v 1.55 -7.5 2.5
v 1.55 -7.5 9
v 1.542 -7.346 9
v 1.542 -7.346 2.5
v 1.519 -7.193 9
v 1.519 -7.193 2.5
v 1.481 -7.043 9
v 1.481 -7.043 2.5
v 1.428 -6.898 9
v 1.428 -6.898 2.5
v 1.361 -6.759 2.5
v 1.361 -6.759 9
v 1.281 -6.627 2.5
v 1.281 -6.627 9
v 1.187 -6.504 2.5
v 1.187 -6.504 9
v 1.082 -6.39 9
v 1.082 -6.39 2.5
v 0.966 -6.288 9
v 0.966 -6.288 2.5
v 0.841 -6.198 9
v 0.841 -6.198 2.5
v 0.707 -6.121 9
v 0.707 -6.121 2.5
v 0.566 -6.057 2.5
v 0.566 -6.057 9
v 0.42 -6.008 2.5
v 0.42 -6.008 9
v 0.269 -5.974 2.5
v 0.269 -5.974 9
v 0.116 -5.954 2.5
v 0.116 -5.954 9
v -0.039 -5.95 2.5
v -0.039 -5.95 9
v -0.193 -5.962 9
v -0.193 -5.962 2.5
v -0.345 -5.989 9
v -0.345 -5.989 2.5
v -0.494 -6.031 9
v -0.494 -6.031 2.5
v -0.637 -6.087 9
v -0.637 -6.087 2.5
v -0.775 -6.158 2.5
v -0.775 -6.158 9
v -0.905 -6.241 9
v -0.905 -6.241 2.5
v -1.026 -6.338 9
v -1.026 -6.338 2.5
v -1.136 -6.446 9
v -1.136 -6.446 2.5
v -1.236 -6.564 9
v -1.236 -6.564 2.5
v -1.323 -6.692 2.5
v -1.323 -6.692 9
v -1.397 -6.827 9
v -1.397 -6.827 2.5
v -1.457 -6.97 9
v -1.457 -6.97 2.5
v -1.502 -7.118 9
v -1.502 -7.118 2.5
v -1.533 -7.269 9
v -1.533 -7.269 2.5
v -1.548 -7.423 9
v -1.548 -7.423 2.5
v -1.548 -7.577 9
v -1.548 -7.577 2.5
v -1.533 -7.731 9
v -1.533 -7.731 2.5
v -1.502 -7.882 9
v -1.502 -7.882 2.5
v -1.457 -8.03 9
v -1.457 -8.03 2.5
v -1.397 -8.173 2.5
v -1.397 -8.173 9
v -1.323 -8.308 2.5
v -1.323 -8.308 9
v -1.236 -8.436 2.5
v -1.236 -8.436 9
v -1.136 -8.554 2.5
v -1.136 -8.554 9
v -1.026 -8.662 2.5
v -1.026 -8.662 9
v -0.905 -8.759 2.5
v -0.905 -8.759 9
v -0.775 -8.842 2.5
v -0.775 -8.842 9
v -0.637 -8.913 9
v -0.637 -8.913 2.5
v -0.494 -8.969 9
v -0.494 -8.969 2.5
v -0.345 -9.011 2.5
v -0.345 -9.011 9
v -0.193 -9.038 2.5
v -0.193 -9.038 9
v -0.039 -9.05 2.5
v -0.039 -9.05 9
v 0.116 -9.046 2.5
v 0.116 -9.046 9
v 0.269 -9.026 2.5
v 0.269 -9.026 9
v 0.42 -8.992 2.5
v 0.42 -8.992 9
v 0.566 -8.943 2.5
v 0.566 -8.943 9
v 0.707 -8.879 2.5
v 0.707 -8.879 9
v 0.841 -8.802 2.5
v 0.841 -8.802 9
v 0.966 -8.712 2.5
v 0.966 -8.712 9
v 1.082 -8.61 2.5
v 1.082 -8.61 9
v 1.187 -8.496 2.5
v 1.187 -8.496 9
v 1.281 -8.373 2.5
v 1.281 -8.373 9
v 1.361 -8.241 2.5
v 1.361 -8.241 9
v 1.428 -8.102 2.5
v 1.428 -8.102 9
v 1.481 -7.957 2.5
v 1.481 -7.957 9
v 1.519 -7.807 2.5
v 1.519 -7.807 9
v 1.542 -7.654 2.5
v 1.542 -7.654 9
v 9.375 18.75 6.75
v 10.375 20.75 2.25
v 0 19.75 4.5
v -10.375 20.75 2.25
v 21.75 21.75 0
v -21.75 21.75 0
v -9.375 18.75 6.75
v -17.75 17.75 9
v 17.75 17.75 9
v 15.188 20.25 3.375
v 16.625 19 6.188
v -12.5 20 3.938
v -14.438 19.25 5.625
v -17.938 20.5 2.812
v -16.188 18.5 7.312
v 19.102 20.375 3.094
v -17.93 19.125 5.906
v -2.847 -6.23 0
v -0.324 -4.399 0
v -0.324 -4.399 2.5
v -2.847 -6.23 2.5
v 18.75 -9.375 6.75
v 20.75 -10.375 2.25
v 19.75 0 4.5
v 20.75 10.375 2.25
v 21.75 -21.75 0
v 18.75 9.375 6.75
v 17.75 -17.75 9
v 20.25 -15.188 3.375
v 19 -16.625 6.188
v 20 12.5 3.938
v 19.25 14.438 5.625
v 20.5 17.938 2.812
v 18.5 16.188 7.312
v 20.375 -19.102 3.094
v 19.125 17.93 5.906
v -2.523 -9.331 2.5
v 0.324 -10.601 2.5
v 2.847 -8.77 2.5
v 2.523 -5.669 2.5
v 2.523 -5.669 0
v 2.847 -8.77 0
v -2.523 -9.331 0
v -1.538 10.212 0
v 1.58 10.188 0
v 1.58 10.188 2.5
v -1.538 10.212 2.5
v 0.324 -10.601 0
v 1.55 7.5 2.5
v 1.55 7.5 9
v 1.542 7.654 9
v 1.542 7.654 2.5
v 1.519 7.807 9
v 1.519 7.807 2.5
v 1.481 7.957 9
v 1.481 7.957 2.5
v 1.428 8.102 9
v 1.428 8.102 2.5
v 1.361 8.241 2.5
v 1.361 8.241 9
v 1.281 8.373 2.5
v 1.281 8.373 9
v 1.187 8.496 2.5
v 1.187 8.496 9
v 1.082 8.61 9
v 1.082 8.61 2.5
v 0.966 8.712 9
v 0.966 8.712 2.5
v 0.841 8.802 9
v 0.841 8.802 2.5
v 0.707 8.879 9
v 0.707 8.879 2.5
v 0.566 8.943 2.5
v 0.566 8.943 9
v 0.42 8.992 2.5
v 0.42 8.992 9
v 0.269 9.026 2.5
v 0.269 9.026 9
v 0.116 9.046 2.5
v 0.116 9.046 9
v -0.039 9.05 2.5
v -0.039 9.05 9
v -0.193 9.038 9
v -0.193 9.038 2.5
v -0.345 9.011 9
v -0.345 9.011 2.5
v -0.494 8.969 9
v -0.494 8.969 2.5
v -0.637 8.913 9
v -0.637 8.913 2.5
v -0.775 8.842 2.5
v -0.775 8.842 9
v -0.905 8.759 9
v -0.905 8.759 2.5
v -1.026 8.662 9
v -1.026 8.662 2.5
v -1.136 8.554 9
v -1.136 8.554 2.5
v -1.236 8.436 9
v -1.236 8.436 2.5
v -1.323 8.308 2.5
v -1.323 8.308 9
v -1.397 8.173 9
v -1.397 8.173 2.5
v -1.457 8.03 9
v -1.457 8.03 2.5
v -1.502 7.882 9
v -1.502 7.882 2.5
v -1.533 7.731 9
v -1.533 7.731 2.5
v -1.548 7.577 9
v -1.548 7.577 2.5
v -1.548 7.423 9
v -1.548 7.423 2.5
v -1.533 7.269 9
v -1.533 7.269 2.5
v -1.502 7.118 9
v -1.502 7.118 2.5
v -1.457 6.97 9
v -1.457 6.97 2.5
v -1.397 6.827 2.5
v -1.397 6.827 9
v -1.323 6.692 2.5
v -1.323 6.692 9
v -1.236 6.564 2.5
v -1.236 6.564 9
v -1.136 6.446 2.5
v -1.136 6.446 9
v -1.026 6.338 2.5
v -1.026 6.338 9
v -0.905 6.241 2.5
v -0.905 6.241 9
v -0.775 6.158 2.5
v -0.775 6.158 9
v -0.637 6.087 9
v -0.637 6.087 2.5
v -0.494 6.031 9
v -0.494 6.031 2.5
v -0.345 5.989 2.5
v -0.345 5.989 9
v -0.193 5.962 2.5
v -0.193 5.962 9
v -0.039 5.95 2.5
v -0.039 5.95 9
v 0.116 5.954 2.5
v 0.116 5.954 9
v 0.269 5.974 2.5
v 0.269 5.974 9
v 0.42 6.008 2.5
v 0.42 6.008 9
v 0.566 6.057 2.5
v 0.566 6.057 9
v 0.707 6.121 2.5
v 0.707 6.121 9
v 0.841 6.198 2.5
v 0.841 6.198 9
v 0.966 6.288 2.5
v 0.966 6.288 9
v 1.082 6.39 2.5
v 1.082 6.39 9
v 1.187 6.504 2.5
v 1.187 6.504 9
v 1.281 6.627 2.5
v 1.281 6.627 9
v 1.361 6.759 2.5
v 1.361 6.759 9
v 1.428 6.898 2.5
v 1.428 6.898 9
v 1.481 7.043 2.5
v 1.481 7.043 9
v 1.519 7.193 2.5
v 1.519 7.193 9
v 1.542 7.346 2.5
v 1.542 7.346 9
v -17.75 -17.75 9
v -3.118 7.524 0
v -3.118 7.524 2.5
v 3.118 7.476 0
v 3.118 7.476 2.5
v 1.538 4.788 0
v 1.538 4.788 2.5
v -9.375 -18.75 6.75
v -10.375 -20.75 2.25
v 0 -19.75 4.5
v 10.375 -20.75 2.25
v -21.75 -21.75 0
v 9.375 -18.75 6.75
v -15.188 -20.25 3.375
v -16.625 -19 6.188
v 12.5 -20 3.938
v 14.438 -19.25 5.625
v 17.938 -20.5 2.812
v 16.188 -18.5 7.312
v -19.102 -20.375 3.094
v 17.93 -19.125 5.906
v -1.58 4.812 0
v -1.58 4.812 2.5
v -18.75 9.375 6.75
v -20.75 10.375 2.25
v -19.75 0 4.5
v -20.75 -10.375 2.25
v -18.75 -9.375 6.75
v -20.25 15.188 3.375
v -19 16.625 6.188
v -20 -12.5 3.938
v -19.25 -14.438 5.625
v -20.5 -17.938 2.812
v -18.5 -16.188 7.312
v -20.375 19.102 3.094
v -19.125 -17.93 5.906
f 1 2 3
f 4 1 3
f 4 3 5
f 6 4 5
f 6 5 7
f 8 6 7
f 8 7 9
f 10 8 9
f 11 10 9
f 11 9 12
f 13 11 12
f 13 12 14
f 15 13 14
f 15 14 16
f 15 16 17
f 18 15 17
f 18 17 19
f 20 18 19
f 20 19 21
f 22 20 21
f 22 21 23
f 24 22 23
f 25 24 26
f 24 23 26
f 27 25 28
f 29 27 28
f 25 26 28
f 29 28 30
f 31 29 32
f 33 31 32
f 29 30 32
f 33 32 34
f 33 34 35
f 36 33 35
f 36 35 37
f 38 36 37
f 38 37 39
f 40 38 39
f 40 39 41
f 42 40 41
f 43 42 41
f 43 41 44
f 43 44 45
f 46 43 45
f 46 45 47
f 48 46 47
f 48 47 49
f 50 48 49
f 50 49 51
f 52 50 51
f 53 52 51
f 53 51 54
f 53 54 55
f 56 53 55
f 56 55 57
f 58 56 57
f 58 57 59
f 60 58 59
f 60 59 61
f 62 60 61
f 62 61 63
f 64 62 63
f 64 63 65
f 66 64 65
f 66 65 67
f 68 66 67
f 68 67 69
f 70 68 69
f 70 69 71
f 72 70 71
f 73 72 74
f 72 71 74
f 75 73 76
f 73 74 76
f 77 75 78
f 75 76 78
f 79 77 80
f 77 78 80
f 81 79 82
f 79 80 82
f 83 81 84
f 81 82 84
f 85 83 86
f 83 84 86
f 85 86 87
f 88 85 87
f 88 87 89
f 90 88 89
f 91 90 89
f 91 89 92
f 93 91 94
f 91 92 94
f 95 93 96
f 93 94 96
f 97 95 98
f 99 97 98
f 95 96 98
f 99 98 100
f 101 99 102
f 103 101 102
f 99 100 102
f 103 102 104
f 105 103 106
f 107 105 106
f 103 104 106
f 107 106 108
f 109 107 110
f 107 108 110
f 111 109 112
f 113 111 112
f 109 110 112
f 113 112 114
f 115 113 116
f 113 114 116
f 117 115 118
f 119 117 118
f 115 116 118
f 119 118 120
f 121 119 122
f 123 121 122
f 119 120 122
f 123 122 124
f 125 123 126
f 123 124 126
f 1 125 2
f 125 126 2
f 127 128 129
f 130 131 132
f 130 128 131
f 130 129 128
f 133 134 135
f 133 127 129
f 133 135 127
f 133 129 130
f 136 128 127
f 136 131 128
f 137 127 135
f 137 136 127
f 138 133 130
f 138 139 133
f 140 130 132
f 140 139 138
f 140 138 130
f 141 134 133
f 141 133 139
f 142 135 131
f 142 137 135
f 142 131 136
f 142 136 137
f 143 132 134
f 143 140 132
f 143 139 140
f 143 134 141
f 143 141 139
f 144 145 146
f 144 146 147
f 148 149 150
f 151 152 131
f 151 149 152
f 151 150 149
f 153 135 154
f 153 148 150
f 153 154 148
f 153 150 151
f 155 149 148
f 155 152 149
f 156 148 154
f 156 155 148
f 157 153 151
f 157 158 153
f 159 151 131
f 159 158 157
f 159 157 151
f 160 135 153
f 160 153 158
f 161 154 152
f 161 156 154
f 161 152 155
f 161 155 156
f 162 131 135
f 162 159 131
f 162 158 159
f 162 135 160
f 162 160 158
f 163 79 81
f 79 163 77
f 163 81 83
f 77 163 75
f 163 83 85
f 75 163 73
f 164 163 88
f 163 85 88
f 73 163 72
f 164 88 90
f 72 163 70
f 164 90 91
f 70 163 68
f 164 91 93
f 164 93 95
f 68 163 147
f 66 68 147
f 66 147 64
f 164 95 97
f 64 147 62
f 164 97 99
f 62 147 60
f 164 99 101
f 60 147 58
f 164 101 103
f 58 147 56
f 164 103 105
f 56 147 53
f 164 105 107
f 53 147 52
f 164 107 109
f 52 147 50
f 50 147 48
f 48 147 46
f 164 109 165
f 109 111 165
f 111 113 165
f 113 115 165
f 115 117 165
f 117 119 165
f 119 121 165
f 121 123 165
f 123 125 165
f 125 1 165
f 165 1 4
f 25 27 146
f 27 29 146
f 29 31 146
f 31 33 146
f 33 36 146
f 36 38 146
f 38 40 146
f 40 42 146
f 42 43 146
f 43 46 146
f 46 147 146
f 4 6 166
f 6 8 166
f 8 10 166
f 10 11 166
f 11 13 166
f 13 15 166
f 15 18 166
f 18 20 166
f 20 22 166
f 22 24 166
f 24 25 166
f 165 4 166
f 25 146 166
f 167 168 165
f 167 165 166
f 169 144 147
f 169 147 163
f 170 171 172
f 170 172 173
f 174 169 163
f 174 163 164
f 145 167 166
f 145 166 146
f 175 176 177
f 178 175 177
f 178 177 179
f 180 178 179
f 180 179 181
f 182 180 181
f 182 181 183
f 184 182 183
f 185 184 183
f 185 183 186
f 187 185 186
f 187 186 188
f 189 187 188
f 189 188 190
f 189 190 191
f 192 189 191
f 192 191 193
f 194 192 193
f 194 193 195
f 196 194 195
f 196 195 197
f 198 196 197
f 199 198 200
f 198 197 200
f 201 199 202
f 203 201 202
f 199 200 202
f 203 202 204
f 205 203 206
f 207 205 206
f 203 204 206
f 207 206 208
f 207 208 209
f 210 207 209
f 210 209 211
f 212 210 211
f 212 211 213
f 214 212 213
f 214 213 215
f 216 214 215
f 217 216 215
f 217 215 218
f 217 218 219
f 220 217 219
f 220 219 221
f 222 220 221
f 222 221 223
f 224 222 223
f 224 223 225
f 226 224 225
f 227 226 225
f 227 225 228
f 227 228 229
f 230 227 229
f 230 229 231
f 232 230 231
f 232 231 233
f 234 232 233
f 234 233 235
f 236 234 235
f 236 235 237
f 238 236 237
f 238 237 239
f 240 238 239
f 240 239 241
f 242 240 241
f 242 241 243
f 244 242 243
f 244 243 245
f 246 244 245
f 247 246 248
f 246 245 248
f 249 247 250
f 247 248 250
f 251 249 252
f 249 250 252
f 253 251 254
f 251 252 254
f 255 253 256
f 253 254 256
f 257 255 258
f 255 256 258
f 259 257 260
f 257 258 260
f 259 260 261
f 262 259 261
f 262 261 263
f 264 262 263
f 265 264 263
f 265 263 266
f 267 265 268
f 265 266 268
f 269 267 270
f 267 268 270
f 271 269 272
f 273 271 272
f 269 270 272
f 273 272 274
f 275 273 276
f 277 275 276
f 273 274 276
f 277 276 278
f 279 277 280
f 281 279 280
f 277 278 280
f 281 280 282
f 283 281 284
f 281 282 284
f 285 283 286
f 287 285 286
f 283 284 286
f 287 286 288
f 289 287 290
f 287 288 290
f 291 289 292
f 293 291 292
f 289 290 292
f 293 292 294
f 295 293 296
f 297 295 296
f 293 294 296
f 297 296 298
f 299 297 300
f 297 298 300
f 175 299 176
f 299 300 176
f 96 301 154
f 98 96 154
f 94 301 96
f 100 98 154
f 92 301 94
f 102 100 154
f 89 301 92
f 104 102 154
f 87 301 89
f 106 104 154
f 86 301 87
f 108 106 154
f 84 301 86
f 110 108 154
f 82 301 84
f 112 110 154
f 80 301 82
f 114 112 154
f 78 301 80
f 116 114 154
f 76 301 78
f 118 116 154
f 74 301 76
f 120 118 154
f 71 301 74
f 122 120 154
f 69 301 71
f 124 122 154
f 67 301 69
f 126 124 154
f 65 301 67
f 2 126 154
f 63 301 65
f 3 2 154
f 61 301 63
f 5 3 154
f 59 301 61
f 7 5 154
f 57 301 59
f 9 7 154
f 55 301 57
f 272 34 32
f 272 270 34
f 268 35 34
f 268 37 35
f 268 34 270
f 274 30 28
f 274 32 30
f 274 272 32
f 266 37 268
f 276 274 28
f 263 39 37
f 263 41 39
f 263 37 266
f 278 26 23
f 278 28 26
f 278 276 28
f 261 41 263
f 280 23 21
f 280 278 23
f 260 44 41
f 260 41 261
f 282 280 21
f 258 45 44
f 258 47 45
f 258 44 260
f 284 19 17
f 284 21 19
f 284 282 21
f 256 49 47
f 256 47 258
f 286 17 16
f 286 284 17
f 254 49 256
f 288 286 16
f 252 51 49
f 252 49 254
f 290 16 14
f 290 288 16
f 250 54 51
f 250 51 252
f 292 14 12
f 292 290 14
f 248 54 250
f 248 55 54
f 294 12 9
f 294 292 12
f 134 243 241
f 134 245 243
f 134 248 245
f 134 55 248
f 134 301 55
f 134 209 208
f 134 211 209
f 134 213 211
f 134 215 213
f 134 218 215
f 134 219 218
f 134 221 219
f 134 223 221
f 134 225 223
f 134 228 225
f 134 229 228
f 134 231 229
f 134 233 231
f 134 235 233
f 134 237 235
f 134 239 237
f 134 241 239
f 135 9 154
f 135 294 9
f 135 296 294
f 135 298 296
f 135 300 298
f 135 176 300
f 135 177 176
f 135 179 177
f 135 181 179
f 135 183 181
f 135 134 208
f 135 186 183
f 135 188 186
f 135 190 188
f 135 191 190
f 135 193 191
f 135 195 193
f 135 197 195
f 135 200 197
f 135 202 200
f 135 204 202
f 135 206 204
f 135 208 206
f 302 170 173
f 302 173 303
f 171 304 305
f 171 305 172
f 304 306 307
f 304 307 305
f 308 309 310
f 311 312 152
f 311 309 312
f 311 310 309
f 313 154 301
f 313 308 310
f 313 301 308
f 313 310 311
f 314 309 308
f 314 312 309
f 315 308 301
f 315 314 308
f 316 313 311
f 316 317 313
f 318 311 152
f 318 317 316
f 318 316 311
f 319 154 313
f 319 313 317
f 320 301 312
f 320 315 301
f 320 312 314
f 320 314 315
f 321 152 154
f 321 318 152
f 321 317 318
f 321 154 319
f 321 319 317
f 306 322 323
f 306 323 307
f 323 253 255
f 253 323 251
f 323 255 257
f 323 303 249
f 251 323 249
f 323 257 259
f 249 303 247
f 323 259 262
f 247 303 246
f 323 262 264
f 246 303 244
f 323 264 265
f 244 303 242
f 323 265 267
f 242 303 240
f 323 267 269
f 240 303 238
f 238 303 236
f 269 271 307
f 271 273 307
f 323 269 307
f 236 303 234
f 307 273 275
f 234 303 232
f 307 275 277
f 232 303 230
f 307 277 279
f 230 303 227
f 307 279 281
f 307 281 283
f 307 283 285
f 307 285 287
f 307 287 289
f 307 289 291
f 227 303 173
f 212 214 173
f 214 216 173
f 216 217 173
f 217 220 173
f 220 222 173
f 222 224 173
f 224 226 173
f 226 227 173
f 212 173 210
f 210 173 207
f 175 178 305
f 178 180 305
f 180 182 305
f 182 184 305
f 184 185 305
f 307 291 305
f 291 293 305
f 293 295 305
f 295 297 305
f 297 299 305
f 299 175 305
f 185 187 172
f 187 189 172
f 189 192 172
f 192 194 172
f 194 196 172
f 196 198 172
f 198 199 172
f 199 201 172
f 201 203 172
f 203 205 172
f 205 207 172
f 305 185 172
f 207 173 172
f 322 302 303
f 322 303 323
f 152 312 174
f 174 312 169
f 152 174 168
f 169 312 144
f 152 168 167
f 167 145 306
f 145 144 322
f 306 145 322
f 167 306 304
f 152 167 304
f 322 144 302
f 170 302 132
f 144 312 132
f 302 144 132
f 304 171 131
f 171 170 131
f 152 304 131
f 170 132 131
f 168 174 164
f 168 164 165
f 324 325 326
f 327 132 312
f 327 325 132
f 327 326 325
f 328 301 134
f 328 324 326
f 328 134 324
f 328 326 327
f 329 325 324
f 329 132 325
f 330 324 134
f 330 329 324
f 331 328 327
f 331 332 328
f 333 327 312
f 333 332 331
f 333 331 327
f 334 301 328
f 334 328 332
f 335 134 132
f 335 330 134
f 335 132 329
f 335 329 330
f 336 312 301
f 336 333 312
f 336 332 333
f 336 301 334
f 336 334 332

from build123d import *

# Parameters (mm, degrees)
F0_W      = 43.5
F0_H      = 43.5
F3_W      = 35.5
F3_H      = 35.5
F6_R      = 1.55
F8_DEPTH  = 9.0010001
F9_DEPTH  = 9.0010001
F10_DEPTH = 2.5
F11_DEPTH = 2.5


with BuildPart() as f4:
    # F0 (on Top) → F4 section 0
    with BuildSketch(Plane.XY):
        Rectangle(F0_W, F0_H)
    # F3 (on offset) → F4 section 1
    with BuildSketch(Plane.XY.offset(9)):
        Rectangle(F3_W, F3_H)
    loft()

    # F6 (on face) → F8 (cut, through all)
    with BuildSketch(Plane.XY.offset(9)):
        with Locations((0, 7.5)):
            Circle(F6_R)
    extrude(amount=-F8_DEPTH, mode=Mode.SUBTRACT)

    # F6 (on face) → F9 (cut, through all)
    with BuildSketch(Plane.XY.offset(9)):
        with Locations((0, -7.5)):
            Circle(F6_R)
    extrude(amount=-F9_DEPTH, mode=Mode.SUBTRACT)

    # F7 (on Top) → F10 (cut)
    with BuildSketch(Plane.XY):
        Polygon((0.3239838625, -10.6008119029), (2.8473738115, -8.7698276961), (2.523389949, -5.6690157933), (-0.3239838625, -4.3991880971), (-2.8473738115, -6.2301723039), (-2.523389949, -9.3309842067), align=None)
    extrude(amount=F10_DEPTH, mode=Mode.SUBTRACT)

    # F7 (on Top) → F11 (cut)
    with BuildSketch(Plane.XY):
        Polygon((3.1175957979, 7.4755778561), (1.579948096, 10.1877060877), (-1.5376477019, 10.2121282317), (-3.1175957979, 7.5244221439), (-1.579948096, 4.8122939123), (1.5376477019, 4.7878717683), align=None)
    extrude(amount=F11_DEPTH, mode=Mode.SUBTRACT)


solid = f4.part
